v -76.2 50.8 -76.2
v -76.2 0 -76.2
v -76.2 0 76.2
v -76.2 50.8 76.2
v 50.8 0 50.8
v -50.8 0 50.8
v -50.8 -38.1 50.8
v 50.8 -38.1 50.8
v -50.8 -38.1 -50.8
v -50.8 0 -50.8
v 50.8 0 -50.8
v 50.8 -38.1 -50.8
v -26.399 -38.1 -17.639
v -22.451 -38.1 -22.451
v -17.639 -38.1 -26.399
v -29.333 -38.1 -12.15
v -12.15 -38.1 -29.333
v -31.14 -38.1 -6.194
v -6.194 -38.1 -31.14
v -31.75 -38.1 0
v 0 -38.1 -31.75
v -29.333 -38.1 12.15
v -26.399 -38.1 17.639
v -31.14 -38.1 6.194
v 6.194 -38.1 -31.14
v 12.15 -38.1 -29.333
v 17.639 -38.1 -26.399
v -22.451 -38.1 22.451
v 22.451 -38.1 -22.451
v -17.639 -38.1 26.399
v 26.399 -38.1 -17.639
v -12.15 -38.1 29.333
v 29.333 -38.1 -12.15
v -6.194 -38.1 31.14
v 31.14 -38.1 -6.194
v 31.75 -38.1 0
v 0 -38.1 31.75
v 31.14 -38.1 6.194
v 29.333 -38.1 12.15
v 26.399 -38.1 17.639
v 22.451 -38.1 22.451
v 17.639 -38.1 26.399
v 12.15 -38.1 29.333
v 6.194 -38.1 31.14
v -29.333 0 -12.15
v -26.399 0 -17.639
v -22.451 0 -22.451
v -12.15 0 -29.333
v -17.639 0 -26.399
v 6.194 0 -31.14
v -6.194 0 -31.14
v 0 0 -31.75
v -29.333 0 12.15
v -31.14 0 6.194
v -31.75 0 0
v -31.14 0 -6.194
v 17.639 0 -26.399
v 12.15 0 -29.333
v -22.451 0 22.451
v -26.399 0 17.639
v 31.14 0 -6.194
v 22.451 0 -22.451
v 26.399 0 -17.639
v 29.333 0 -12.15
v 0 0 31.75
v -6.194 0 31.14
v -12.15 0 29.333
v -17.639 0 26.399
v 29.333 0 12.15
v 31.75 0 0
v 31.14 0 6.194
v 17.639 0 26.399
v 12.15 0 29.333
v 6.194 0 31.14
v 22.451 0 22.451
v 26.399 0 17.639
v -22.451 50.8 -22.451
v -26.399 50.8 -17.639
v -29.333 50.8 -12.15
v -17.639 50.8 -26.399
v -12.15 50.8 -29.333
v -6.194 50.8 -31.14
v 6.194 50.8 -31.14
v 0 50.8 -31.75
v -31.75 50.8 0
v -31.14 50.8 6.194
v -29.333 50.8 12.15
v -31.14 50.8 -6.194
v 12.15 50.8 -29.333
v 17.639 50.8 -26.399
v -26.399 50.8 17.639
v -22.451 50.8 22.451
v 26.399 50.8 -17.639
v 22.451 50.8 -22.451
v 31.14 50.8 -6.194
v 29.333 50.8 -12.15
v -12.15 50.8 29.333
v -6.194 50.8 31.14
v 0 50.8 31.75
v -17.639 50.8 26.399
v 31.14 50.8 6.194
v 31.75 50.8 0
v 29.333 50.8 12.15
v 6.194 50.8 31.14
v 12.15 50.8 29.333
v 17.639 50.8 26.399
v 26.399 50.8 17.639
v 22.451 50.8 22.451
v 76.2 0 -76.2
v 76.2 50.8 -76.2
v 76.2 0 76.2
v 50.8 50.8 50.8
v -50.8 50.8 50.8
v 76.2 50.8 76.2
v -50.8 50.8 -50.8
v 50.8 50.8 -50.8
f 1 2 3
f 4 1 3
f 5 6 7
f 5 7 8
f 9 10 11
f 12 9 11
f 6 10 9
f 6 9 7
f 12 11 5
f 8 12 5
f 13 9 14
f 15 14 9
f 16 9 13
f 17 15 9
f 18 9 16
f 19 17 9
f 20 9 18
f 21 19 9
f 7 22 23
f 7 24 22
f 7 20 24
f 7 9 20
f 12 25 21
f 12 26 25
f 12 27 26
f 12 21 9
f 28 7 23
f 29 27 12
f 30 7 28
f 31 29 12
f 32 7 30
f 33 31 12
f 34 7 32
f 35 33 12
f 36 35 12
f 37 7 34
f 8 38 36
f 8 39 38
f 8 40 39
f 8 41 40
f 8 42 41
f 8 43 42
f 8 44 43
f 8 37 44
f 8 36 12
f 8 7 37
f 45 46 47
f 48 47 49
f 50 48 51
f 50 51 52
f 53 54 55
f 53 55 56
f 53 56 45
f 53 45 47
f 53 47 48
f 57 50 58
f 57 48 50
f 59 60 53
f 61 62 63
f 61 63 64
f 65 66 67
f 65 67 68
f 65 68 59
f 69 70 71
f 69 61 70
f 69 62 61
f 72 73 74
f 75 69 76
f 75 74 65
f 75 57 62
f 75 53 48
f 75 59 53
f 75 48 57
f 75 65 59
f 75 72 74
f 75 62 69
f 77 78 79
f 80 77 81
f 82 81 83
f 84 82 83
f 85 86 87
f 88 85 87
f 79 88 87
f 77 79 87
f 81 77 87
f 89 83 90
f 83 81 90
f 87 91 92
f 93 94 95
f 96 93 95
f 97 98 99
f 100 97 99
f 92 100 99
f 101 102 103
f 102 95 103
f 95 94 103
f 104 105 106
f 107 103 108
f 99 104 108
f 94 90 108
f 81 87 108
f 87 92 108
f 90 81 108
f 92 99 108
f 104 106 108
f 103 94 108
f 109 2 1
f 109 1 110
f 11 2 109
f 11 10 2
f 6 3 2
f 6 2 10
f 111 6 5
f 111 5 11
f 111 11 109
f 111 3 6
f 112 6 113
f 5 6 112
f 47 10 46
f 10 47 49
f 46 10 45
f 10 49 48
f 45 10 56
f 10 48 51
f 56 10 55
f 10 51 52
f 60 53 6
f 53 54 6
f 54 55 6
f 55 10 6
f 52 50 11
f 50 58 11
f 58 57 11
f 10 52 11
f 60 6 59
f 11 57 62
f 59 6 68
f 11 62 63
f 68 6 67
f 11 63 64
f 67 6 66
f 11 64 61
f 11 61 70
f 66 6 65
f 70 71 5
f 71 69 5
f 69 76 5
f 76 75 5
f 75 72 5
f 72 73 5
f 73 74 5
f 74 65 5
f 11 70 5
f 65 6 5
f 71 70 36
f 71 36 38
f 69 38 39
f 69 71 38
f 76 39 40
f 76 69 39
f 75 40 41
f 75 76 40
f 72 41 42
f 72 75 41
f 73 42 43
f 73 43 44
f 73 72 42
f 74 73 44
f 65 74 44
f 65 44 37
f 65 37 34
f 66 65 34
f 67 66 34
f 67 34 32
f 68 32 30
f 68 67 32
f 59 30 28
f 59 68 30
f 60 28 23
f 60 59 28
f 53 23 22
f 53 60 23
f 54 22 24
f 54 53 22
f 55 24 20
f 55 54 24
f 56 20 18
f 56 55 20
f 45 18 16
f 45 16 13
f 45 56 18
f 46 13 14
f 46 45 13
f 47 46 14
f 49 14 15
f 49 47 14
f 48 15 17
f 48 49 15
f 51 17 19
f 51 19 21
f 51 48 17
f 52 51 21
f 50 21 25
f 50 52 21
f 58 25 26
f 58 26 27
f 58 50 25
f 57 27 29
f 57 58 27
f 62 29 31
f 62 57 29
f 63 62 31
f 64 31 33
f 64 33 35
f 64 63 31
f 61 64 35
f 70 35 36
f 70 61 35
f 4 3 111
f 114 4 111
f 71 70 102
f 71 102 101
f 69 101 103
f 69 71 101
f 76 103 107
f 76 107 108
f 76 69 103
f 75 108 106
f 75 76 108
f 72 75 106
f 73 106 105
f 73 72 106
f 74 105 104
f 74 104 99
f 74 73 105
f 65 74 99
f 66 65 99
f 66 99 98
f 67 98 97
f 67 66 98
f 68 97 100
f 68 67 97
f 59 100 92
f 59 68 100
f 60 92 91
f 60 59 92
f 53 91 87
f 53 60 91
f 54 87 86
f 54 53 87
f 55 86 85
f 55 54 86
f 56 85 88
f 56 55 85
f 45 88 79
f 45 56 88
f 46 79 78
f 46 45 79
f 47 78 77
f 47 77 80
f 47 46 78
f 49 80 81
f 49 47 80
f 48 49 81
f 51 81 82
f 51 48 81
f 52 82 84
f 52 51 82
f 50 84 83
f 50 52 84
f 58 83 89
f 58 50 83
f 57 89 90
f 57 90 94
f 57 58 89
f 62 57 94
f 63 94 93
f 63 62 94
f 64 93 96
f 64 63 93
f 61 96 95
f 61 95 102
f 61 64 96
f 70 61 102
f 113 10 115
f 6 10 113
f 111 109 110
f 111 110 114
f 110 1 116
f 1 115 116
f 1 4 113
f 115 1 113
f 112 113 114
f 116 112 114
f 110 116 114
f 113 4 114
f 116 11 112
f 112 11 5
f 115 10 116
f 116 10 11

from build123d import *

# Parameters (mm, degrees)
F0_W     = 101.6
F0_H     = 101.6
F0_R     = 31.75
F1_DEPTH = 38.1
F0_W_2   = 152.4
F0_H_2   = 152.4
F2_DEPTH = 50.8
F3_DEPTH = 50.8


with BuildPart() as f1:
    # F0 (on Front) → F1 (new body)
    with BuildSketch(Plane.XZ):
        Rectangle(F0_W, F0_H)
        Circle(F0_R, mode=Mode.SUBTRACT)
    extrude(amount=F1_DEPTH)

    # F0 (on Front) → F3 (join)
    with BuildSketch(Plane.XZ):
        Circle(F0_R)
    extrude(amount=-F3_DEPTH)


with BuildPart() as f2:
    # F0 (on Front) → F2 (new body)
    with BuildSketch(Plane.XZ):
        Rectangle(F0_W_2, F0_H_2)
        Rectangle(F0_W, F0_H, mode=Mode.SUBTRACT)
    extrude(amount=-F2_DEPTH)


solid = Compound([f1.part, f2.part])
